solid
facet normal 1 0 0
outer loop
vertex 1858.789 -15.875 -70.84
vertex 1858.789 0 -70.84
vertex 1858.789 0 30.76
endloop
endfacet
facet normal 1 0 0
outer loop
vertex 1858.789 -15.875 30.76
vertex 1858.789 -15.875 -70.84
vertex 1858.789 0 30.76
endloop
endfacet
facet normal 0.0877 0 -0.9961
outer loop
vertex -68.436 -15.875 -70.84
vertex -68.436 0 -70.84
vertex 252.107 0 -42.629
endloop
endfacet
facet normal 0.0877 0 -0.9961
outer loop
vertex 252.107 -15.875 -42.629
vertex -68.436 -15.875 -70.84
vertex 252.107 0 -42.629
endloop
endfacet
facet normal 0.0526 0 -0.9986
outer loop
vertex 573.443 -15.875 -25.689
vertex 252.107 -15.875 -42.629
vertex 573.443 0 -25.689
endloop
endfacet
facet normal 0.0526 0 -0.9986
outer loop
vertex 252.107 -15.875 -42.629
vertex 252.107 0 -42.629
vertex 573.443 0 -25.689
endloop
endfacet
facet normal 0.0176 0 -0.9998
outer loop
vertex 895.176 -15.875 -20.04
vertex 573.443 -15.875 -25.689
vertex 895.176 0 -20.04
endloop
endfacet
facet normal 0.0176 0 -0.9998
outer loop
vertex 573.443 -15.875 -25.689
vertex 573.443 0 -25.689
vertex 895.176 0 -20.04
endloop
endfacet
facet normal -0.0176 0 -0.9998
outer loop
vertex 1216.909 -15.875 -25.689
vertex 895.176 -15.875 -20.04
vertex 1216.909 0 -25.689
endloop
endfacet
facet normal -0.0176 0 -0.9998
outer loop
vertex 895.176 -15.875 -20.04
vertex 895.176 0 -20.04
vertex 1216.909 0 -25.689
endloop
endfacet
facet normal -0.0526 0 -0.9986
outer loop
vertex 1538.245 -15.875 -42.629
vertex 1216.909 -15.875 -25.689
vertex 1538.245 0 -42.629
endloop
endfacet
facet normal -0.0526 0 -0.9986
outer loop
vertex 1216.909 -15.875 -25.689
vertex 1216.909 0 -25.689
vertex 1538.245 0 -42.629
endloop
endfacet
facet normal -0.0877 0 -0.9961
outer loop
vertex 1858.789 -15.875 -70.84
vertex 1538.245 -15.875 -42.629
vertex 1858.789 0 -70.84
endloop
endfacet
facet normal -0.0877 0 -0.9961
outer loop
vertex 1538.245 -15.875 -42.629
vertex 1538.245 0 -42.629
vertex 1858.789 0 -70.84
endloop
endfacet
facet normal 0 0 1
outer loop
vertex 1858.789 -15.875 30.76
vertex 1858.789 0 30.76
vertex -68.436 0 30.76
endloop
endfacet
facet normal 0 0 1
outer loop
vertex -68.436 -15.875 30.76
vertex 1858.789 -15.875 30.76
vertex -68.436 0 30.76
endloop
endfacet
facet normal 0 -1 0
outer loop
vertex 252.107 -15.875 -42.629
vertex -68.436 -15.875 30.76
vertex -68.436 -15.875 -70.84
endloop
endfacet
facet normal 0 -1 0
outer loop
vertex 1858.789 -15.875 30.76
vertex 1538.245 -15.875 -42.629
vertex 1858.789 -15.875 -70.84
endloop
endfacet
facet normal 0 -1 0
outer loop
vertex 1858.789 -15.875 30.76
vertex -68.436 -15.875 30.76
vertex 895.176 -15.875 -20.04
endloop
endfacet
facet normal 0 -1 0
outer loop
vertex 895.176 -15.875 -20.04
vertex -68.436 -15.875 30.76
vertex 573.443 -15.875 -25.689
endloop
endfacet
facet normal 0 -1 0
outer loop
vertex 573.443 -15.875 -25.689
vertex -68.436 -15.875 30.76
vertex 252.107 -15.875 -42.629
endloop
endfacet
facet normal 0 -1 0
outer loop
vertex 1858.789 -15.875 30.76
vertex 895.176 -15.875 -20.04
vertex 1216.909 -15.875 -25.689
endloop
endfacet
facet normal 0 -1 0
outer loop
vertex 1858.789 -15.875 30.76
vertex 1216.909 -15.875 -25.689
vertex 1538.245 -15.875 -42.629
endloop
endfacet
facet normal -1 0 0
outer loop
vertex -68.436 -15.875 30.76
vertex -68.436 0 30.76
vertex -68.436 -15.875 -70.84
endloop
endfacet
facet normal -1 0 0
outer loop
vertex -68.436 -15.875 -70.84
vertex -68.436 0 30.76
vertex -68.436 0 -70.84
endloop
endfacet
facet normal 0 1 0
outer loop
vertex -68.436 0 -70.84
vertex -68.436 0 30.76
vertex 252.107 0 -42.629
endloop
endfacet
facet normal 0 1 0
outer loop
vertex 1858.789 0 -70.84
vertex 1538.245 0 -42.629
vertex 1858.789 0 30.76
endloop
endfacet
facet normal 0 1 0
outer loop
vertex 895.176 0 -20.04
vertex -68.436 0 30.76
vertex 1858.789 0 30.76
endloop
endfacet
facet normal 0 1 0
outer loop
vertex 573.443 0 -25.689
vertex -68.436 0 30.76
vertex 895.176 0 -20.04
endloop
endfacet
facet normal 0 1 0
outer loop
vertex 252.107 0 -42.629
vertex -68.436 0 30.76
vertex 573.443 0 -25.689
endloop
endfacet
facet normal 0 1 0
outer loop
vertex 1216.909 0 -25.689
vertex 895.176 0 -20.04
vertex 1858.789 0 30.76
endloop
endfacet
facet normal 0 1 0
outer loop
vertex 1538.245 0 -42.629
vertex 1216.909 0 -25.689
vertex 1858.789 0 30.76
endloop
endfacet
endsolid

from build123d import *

# Parameters (mm, degrees)
F1_DEPTH = 25.4
F4_DEPTH = 15.875


with BuildPart() as f1:
    # F0 (on Front) → F1 (new body)
    with BuildSketch(Plane.XZ):
        with BuildLine():
            Line((1863.8208496928, 32.7376453102), (-63.4041503072, 32.7376453102))
            Line((-63.4041503072, 32.7376453102), (-63.4041503072, -43.4623546898))
            ThreePointArc((-63.4041503072, -43.4623546898), (900.2083496928, 7.3376453102), (1863.8208496928, -43.4623546898))
            Line((1863.8208496928, -43.4623546898), (1863.8208496928, 32.7376453102))
        make_face()
    extrude(amount=F1_DEPTH)


with BuildPart() as f4:
    # F3 (on Front) → F4 (new body)
    with BuildSketch(Plane.XZ):
        with BuildLine():
            Line((1858.7887722611, 30.7600510478), (-68.4362277389, 30.7600510478))
            Line((-68.4362277389, 30.7600510478), (-68.4362277389, -70.8399489522))
            ThreePointArc((-68.4362277389, -70.8399489521), (895.1762722611, -20.0399489521), (1858.7887722611, -70.8399489521))
            Line((1858.7887722611, -70.8399489522), (1858.7887722611, 30.7600510478))
        make_face()
    extrude(amount=F4_DEPTH)


solid = f4.part
